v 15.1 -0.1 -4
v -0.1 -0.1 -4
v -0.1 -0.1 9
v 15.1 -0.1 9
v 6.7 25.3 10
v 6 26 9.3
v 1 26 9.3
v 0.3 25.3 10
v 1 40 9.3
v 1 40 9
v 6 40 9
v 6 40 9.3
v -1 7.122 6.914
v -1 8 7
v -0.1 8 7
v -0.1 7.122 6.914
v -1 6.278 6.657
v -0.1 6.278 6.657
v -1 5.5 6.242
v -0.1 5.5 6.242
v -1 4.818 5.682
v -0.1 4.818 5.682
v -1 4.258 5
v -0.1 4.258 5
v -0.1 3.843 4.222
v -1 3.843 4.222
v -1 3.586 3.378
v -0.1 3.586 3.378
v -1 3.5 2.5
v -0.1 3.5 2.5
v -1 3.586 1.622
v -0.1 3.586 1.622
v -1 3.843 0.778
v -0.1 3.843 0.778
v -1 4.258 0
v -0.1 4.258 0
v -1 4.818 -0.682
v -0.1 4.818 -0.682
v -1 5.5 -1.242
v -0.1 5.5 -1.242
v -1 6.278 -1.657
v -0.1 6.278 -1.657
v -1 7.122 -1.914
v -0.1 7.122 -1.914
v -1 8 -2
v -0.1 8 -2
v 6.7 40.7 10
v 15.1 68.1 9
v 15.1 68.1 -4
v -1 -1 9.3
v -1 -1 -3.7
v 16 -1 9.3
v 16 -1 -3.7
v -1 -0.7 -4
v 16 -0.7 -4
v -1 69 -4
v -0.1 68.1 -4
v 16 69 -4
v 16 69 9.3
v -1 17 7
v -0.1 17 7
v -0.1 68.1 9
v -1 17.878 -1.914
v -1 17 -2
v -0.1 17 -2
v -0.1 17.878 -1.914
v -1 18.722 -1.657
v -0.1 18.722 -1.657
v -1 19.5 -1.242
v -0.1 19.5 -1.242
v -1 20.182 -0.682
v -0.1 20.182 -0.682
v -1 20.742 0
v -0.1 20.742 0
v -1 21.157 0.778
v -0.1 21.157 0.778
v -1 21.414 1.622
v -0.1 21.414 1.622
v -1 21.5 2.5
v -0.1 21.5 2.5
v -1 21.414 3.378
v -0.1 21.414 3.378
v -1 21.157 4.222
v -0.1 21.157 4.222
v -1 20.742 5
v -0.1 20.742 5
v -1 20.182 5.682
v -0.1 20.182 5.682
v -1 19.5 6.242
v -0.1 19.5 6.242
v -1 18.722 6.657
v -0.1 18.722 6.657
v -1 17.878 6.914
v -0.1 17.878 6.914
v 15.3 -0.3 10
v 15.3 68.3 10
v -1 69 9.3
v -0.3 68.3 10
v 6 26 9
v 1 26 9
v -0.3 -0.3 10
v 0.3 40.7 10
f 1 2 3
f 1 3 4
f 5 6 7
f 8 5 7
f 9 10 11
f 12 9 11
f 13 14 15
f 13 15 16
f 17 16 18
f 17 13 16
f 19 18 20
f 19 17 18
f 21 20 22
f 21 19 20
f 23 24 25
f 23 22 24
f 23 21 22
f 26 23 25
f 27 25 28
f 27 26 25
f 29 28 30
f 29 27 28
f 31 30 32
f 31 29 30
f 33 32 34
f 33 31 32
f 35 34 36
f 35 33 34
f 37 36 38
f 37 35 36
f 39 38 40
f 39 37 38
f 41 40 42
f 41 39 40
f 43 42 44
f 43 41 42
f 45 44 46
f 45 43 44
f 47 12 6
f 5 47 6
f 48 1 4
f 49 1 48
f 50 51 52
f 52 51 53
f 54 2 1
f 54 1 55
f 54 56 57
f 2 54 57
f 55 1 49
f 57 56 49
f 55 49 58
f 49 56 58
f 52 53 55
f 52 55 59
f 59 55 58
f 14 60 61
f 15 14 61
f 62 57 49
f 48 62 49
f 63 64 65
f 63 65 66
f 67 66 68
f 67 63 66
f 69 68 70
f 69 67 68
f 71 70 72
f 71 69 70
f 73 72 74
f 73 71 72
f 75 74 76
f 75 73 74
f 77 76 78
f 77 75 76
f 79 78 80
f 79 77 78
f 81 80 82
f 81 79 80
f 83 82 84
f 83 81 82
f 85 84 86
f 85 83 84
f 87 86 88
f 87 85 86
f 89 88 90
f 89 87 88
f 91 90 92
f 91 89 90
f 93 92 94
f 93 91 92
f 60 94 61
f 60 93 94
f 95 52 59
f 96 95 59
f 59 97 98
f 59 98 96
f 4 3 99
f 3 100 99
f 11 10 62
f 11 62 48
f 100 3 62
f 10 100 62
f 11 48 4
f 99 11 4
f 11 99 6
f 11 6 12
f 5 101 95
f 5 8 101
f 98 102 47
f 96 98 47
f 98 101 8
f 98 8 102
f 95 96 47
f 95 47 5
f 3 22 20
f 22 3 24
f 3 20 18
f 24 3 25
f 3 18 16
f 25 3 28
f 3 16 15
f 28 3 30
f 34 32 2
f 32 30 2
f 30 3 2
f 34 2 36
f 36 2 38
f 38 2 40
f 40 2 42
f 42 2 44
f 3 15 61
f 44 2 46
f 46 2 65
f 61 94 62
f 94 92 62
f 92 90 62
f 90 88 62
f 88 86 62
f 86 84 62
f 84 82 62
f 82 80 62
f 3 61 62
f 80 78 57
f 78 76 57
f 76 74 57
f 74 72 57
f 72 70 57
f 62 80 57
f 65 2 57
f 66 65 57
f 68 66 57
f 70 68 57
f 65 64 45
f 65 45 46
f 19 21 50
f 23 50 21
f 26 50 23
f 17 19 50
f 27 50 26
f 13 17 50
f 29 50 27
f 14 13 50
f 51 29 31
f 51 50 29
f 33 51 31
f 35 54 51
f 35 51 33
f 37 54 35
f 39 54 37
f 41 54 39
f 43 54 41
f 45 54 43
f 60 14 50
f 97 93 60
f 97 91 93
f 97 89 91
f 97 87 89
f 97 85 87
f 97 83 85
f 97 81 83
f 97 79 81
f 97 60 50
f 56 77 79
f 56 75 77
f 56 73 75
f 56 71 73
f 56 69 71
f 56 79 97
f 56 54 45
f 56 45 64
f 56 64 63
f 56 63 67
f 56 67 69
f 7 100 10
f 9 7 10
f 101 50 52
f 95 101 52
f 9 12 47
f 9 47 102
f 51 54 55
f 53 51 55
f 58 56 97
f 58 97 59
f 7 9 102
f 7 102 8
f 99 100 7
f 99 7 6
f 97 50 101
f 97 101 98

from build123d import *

# Parameters (mm, degrees)
BOX003_W          = 12
BOX003_H          = 9
BOX003_DEPTH      = 9
CYLINDER002_R     = 4.5
CYLINDER002_DEPTH = 12
CYLINDER003_R     = 4.5
CYLINDER003_DEPTH = 12
BOX002_W          = 5
BOX002_H          = 14
BOX002_DEPTH      = 11
BOX_W             = 15.2
BOX_H             = 68.2
BOX_DEPTH         = 18
BOX001_W          = 17
BOX001_H          = 70
BOX001_DEPTH      = 14
CHAMFER_SIZE      = 0.7
CHAMFER001_SIZE   = 0.7
CHAMFER005_SIZE   = 0.3


with BuildPart() as cubo002:
    # Box003 → Box003 (new body)
    with BuildSketch(Plane(origin=(-8, 8, -2), x_dir=(1, 0, 0), z_dir=(0, 0, 1))):
        with Locations((6, 4.5)):
            Rectangle(BOX003_W, BOX003_H)
    extrude(amount=BOX003_DEPTH)


with BuildPart() as cilindro001:
    # Cylinder002 → Cylinder002 (new body)
    with BuildSketch(Plane(origin=(-8, 8, 2.5), x_dir=(0, 0, -1), z_dir=(1, 0, 0))):
        Circle(CYLINDER002_R)
    extrude(amount=CYLINDER002_DEPTH)


with BuildPart() as fusion:
    # Cylinder003 → Cylinder003 (new body)
    with BuildSketch(Plane(origin=(-8, 17, 2.5), x_dir=(0, 0, -1), z_dir=(1, 0, 0))):
        Circle(CYLINDER003_R)
    extrude(amount=CYLINDER003_DEPTH)

    # Fusion: union Cilindro001
    add(cilindro001.part)


with BuildPart() as cubo001:
    # Box002 → Box002 (new body)
    with BuildSketch(Plane(origin=(1, 26, 2), x_dir=(1, 0, 0), z_dir=(0, 0, 1))):
        with Locations((2.5, 7)):
            Rectangle(BOX002_W, BOX002_H)
    extrude(amount=BOX002_DEPTH)


with BuildPart() as foroslot:
    # Box → Box (new body)
    with BuildSketch(Plane(origin=(-0.1, -0.1, -9), x_dir=(1, 0, 0), z_dir=(0, 0, 1))):
        with Locations((7.6, 34.1)):
            Rectangle(BOX_W, BOX_H)
    extrude(amount=BOX_DEPTH)


with BuildPart() as chamfer005:
    # Box001 → Box001 (new body)
    with BuildSketch(Plane(origin=(-1, -1, -4), x_dir=(1, 0, 0), z_dir=(0, 0, 1))):
        with Locations((8.5, 35)):
            Rectangle(BOX001_W, BOX001_H)
    extrude(amount=BOX001_DEPTH)

    # Cut: cut foroSlot
    add(foroslot.part, mode=Mode.SUBTRACT)

    # Cut001: cut Cubo001
    add(cubo001.part, mode=Mode.SUBTRACT)

    # Chamfer
    chamfer_edges = [chamfer005.edges().sort_by_distance(p)[0] for p in [
        (3.5, 26, 10),
        (6, 33, 10),
        (3.5, 40, 10),
        (1, 33, 10),
    ]]
    chamfer(chamfer_edges, length=CHAMFER_SIZE)

    # Chamfer001
    chamfer001_edges = [chamfer005.edges().sort_by_distance(p)[0] for p in [
        (-1, 34, 10),
        (7.5, -1, 10),
        (16, 34, 10),
        (7.5, 69, 10),
    ]]
    chamfer(chamfer001_edges, length=CHAMFER001_SIZE)

    # Cut002: cut Fusion
    add(fusion.part, mode=Mode.SUBTRACT)

    # Cut005: cut Cubo002
    add(cubo002.part, mode=Mode.SUBTRACT)

    # Chamfer005
    chamfer005_edges = [chamfer005.edges().sort_by_distance(p)[0] for p in [
        (7.5, -1, -4),
    ]]
    chamfer(chamfer005_edges, length=CHAMFER005_SIZE)


solid = chamfer005.part
